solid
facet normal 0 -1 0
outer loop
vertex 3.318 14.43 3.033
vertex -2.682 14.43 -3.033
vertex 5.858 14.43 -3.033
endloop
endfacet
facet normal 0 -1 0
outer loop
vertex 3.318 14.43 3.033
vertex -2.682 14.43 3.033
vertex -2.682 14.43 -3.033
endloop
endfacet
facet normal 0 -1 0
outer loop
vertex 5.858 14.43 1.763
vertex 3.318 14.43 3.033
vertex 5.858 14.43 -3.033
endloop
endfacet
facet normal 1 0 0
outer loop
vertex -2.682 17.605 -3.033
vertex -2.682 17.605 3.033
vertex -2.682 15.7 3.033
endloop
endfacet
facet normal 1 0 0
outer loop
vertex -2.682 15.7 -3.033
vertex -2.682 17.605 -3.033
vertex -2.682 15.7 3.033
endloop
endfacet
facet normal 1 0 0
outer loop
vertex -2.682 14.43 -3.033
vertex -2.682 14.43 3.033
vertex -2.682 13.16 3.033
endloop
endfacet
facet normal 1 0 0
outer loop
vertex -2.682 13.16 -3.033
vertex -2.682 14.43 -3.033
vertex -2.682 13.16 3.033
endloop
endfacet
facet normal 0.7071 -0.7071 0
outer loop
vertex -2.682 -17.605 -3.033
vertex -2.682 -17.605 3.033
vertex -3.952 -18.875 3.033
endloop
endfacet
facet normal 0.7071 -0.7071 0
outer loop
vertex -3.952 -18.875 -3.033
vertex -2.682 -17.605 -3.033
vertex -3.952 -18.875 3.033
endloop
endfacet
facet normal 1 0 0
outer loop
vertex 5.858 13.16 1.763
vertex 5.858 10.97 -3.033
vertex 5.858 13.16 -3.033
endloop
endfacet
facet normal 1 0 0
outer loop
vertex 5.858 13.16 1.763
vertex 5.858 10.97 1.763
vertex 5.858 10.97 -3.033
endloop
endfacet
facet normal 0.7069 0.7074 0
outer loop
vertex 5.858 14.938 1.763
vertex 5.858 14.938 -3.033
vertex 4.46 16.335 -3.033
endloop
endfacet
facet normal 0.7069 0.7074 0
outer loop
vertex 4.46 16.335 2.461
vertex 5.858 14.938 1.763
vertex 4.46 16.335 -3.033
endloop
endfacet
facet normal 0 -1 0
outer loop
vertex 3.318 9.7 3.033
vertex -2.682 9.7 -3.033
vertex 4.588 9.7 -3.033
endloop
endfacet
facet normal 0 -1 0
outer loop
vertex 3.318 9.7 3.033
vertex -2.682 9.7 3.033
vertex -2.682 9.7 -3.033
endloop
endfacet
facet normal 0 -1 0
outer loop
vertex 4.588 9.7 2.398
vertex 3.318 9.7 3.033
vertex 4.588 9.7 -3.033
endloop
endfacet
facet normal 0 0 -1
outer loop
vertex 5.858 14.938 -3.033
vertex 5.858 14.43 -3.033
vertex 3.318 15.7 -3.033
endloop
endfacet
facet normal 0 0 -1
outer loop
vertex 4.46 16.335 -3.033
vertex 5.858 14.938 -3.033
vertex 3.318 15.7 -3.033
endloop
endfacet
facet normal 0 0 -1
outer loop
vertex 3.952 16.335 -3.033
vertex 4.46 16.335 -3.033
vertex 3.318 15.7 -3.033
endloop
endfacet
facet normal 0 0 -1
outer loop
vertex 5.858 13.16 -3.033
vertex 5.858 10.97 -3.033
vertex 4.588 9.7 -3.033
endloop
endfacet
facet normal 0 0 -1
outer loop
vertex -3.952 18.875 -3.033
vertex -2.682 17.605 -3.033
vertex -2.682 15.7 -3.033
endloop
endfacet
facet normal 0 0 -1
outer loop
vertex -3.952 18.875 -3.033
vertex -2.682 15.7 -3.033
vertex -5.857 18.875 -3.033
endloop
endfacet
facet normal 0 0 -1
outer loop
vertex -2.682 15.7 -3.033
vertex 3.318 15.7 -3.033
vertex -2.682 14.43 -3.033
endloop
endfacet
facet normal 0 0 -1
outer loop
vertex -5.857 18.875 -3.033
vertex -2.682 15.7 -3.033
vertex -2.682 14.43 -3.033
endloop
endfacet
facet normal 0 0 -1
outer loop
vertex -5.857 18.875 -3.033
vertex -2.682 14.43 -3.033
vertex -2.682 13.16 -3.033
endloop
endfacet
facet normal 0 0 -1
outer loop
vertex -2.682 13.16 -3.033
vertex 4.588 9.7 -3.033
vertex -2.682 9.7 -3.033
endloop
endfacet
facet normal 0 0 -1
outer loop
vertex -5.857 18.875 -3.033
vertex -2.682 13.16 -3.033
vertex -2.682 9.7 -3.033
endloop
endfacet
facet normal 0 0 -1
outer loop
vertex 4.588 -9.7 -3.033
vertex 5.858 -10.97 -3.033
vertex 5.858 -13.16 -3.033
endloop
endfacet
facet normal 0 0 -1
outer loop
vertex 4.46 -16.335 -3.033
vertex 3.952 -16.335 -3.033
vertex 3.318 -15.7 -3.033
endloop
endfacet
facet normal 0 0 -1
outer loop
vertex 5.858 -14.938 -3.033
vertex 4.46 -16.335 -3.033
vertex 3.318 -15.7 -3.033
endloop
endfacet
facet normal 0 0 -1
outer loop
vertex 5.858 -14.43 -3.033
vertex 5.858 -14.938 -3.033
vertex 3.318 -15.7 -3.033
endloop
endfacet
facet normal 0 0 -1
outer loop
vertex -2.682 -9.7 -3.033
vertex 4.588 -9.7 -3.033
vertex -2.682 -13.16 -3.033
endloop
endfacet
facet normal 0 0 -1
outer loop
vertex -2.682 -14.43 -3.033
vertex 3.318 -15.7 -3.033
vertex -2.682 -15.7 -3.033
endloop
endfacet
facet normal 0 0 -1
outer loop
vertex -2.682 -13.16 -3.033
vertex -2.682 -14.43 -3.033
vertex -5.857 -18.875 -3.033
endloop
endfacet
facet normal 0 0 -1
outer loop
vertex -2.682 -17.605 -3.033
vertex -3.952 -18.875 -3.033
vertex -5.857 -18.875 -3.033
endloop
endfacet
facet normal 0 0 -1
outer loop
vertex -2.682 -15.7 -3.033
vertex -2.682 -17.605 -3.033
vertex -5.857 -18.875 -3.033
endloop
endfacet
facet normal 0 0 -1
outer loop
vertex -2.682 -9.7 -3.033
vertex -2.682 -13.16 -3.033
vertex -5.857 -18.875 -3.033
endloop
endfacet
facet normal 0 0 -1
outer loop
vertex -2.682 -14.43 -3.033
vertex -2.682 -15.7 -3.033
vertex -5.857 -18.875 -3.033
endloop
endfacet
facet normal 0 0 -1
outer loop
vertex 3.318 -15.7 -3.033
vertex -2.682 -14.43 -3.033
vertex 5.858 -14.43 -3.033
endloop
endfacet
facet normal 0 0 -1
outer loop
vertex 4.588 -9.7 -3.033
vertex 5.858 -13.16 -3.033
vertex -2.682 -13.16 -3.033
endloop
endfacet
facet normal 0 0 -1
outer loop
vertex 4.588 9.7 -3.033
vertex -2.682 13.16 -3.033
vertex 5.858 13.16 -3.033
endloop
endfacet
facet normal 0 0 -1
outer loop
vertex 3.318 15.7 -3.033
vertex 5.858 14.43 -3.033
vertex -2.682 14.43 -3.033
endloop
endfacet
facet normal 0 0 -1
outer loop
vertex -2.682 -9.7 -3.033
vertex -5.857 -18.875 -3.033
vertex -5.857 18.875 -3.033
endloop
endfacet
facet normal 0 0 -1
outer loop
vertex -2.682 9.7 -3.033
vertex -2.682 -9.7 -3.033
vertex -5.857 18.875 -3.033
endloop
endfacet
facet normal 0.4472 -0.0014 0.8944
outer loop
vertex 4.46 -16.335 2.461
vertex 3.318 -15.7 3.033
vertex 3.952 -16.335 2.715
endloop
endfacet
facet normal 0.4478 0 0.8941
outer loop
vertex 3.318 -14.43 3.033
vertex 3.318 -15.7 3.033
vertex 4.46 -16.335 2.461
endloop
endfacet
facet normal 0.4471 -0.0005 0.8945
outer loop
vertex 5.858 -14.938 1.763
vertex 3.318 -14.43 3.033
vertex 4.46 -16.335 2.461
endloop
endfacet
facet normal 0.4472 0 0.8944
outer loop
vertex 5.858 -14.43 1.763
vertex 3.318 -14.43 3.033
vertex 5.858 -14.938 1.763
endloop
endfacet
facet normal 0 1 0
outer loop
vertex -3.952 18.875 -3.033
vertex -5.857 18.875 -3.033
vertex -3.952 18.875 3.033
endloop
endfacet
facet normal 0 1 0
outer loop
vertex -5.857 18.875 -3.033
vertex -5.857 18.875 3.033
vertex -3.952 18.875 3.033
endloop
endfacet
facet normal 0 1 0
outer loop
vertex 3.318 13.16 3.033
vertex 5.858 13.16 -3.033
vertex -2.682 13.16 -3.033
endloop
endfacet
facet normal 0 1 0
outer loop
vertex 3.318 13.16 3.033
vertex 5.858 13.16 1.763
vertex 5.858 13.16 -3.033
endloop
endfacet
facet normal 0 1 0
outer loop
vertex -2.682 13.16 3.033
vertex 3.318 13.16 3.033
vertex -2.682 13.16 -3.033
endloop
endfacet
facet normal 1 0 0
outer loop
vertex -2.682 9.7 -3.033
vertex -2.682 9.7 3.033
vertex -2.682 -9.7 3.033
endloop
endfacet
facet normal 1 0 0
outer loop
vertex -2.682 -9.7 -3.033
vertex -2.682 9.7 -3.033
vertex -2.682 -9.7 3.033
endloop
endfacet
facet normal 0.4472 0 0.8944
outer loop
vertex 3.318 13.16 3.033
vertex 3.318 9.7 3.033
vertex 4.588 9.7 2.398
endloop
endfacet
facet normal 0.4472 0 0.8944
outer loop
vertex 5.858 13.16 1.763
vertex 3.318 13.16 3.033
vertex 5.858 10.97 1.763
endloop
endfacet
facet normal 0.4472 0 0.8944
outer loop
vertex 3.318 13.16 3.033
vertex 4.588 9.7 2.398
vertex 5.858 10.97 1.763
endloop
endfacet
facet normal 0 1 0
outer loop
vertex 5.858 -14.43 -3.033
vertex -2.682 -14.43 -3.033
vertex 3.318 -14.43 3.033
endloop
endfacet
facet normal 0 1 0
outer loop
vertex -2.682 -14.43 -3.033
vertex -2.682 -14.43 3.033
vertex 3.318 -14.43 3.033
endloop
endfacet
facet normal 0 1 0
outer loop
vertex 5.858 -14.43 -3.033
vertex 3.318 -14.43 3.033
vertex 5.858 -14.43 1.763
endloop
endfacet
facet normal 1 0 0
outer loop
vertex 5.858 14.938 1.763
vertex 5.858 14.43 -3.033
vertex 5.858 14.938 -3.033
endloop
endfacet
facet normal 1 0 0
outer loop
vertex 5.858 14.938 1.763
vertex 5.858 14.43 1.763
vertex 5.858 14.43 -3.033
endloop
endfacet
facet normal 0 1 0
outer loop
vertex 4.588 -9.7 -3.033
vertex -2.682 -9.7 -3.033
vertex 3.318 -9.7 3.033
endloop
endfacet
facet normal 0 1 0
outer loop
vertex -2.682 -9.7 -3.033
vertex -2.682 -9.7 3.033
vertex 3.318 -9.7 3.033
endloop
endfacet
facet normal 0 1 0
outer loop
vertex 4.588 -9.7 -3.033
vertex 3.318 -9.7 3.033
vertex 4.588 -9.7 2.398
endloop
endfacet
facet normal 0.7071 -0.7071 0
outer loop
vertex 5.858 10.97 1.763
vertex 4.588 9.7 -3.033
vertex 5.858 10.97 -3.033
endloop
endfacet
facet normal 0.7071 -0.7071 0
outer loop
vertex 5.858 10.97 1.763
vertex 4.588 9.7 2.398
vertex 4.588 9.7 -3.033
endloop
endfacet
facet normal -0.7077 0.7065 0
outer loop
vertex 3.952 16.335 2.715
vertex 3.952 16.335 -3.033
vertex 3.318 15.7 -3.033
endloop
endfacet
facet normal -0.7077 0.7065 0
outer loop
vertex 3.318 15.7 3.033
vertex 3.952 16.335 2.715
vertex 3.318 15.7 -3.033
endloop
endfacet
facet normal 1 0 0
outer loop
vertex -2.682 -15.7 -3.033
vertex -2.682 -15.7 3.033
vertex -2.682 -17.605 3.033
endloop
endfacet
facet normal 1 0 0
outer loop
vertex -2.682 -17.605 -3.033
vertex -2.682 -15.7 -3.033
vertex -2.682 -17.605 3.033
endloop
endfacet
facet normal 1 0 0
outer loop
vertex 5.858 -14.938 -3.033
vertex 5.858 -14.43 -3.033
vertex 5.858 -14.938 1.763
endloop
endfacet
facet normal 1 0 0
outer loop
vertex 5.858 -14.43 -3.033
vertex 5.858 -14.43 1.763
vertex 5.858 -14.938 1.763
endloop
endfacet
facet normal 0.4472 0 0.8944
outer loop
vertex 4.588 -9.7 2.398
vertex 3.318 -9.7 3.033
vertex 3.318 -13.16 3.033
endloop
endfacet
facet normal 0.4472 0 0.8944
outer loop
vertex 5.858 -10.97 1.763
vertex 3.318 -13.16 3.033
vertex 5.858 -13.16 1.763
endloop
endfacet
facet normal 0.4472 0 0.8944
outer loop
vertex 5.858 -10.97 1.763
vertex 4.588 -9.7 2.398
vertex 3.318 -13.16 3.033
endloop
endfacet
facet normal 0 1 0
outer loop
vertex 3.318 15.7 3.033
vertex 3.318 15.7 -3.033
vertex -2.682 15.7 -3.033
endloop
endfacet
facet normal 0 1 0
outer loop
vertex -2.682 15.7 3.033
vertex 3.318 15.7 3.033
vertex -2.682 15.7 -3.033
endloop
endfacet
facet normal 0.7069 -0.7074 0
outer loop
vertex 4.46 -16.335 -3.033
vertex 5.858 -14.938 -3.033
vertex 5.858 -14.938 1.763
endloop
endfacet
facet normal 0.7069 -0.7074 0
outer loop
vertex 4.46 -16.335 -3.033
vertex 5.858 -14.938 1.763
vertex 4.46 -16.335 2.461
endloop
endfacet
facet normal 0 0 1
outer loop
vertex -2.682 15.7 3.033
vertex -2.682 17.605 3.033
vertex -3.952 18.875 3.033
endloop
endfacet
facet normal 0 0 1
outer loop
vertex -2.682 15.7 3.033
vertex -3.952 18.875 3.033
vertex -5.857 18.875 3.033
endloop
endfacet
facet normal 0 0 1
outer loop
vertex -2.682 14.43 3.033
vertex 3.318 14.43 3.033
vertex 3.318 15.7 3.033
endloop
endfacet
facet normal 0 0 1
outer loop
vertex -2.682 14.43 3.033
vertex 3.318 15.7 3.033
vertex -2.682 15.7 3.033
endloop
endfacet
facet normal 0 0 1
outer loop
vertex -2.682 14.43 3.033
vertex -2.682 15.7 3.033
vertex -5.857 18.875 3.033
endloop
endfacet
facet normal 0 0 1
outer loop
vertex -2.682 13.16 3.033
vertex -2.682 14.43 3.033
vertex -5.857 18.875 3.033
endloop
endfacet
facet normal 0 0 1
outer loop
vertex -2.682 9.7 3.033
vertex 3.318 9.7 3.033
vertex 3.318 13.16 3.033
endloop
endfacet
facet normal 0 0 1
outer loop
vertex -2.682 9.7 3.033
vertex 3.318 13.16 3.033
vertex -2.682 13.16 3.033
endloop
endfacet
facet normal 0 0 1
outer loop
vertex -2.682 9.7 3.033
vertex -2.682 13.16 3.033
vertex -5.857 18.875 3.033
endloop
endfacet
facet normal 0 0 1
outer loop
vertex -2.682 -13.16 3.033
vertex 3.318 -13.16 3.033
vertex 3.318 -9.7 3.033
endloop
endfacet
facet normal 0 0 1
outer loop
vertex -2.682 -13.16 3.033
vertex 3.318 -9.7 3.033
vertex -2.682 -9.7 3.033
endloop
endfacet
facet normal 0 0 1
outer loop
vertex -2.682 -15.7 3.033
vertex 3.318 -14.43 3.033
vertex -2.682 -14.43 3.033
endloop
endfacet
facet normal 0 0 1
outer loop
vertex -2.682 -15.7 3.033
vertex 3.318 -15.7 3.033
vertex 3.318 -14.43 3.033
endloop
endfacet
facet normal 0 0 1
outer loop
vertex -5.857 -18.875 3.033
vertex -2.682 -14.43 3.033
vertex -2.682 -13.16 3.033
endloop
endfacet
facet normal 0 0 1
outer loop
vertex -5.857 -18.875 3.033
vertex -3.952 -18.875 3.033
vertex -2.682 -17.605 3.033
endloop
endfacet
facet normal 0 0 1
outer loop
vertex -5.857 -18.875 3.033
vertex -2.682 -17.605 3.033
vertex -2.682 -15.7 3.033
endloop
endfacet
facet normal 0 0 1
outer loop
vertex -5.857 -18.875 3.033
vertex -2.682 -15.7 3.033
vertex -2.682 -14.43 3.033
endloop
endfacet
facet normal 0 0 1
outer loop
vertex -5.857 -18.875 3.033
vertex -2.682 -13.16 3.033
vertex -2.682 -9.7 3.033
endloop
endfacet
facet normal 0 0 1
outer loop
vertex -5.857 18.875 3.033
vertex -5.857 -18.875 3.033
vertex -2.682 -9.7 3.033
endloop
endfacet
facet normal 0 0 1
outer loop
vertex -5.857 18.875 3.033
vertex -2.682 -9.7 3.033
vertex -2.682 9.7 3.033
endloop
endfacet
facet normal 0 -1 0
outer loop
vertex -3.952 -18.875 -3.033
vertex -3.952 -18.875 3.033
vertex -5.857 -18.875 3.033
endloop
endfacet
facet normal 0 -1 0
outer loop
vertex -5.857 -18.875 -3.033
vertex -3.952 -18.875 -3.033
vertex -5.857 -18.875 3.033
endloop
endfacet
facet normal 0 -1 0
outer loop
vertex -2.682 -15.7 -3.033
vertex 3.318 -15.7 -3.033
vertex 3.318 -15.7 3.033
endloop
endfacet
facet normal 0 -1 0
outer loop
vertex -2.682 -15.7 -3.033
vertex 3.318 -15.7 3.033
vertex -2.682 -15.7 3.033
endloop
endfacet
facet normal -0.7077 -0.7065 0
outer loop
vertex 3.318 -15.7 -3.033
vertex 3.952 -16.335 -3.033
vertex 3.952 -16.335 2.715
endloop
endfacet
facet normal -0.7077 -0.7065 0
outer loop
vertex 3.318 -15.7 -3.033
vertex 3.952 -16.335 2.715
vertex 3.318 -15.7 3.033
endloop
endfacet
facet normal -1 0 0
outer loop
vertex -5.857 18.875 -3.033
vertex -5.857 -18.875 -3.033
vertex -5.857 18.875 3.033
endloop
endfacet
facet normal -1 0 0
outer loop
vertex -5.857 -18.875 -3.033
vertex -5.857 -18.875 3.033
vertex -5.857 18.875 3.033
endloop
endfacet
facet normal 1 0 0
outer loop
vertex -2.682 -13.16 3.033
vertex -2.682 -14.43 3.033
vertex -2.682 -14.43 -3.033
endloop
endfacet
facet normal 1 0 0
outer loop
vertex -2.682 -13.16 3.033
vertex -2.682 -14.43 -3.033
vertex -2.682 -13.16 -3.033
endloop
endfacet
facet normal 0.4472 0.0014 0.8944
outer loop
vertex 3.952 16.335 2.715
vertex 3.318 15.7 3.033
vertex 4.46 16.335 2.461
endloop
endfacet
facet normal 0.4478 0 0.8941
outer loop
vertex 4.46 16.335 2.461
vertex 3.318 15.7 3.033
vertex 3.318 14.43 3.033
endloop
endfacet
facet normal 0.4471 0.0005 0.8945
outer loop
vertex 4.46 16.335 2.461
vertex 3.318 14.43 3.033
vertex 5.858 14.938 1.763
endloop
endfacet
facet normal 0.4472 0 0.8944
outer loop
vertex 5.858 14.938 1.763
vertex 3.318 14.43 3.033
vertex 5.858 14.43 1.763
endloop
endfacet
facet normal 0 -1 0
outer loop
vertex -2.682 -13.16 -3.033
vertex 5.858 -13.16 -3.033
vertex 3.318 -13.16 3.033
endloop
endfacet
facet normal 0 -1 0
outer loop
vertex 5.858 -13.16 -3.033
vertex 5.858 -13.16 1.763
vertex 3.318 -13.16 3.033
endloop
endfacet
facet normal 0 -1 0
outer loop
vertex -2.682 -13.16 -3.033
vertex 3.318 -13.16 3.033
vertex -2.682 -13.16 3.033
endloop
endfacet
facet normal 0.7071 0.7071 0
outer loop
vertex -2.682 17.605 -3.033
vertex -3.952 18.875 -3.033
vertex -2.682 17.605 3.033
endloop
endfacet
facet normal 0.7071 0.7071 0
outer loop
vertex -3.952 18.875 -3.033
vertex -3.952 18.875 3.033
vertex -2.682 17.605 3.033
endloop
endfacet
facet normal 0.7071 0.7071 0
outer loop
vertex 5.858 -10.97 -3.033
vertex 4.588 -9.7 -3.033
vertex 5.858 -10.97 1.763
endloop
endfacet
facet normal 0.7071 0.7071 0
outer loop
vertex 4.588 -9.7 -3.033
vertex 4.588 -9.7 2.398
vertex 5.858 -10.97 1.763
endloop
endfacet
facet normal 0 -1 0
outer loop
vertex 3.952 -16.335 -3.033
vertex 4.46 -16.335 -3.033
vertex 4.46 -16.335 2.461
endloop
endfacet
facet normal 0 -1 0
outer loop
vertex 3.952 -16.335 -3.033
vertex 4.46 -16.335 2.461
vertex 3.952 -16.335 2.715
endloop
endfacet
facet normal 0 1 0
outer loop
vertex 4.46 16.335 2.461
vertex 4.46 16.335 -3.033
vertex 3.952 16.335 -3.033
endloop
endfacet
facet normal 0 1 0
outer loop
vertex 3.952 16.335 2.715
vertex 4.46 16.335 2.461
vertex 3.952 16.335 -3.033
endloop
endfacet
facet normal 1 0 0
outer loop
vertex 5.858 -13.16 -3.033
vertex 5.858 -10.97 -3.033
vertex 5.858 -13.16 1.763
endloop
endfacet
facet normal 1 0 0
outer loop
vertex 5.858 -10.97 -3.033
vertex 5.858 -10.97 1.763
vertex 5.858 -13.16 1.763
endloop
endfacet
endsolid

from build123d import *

# Parameters (mm, degrees)
BOSS_EXTRUDE1_DEPTH             = 3.032500031
BOSS_EXTRUDE2_REACH             = 21.994
BOSS_EXTRUDE2_DIRECTION_2_REACH = 21.994
CUT_EXTRUDE1_DEPTH              = 30.326387225


with BuildPart() as part:
    # Sketch1 → Boss-Extrude1 (new, symmetric)
    with BuildSketch(Plane.XY):
        Polygon((-3.9525, -18.875), (-5.8575, -18.875), (-5.8575, 18.875), (-3.9525, 18.875), (-2.6825, 17.605), (-2.6825, -17.605), align=None)
    extrude(amount=BOSS_EXTRUDE1_DEPTH, both=True)

    # Boss-Extrude2: up to this face of the body (flat: up to its plane)
    boss_extrude2_end = Plane(part.part.faces().sort_by_distance((-4.285879831, 0, 3.032500031))[0])
    # Sketch1<3> → Boss-Extrude2 (add, up to the picked face)
    with BuildSketch(Plane.XY, mode=Mode.PRIVATE) as boss_extrude2_sk1:
        Polygon((-2.6825, 13.16), (-2.6825, 9.7), (4.5875, 9.7), (5.8575, 10.97), (5.8575, 13.16), align=None)
    boss_extrude2_tool1 = split(extrude(boss_extrude2_sk1.sketch, amount=BOSS_EXTRUDE2_REACH, mode=Mode.PRIVATE), bisect_by=boss_extrude2_end, keep=Keep.BOTH, mode=Mode.PRIVATE)
    # Sketch1<3> → Boss-Extrude2 (add, up to the picked face)
    with BuildSketch(Plane.XY, mode=Mode.PRIVATE) as boss_extrude2_sk2:
        Polygon((-2.6825, 15.7), (-2.6825, 14.43), (5.8575, 14.43), (5.8575, 14.938), (4.4605, 16.335), (3.9525, 16.335), (3.3175, 15.7), align=None)
    boss_extrude2_tool2 = split(extrude(boss_extrude2_sk2.sketch, amount=BOSS_EXTRUDE2_REACH, mode=Mode.PRIVATE), bisect_by=boss_extrude2_end, keep=Keep.BOTH, mode=Mode.PRIVATE)
    add(boss_extrude2_tool1.solids().sort_by(Axis((1.479569, 11.466663, 0), (0, 0, 1)))[0])
    add(boss_extrude2_tool2.solids().sort_by(Axis((1.652648, 15.112693, 0), (0, 0, 1)))[0])

    # Boss-Extrude2 direction 2: up to this face of the body (flat: up to its plane)
    boss_extrude2_direction_2_end = Plane(part.part.faces().sort_by_distance((-4.285879831, 0, -3.032500031))[0])
    # Sketch1<3> → Boss-Extrude2 direction 2 (add, up to the picked face)
    with BuildSketch(Plane.XY, mode=Mode.PRIVATE) as boss_extrude2_direction_2_sk1:
        Polygon((-2.6825, 13.16), (-2.6825, 9.7), (4.5875, 9.7), (5.8575, 10.97), (5.8575, 13.16), align=None)
    boss_extrude2_direction_2_tool1 = split(extrude(boss_extrude2_direction_2_sk1.sketch, amount=-BOSS_EXTRUDE2_DIRECTION_2_REACH, mode=Mode.PRIVATE), bisect_by=boss_extrude2_direction_2_end, keep=Keep.BOTH, mode=Mode.PRIVATE)
    # Sketch1<3> → Boss-Extrude2 direction 2 (add, up to the picked face)
    with BuildSketch(Plane.XY, mode=Mode.PRIVATE) as boss_extrude2_direction_2_sk2:
        Polygon((-2.6825, 15.7), (-2.6825, 14.43), (5.8575, 14.43), (5.8575, 14.938), (4.4605, 16.335), (3.9525, 16.335), (3.3175, 15.7), align=None)
    boss_extrude2_direction_2_tool2 = split(extrude(boss_extrude2_direction_2_sk2.sketch, amount=-BOSS_EXTRUDE2_DIRECTION_2_REACH, mode=Mode.PRIVATE), bisect_by=boss_extrude2_direction_2_end, keep=Keep.BOTH, mode=Mode.PRIVATE)
    add(boss_extrude2_direction_2_tool1.solids().sort_by(Axis((1.479569, 11.466663, 0), (0, 0, -1)))[0])
    add(boss_extrude2_direction_2_tool2.solids().sort_by(Axis((1.652648, 15.112693, 0), (0, 0, -1)))[0])

    # Sketch2 → Cut-Extrude1 (cut, through all)
    with BuildSketch(Plane.XZ.offset(-9.7)):
        Polygon((3.3175, 3.032500031), (5.8575, 1.762500031), (5.8575, 3.032500031), align=None)
    extrude(amount=-CUT_EXTRUDE1_DEPTH, mode=Mode.SUBTRACT)

    # Mirror2: part across plane


with BuildPart() as part_1:
    add(part.part)
    add(part.part.mirror(Plane.ZX))


solid = part_1.part
